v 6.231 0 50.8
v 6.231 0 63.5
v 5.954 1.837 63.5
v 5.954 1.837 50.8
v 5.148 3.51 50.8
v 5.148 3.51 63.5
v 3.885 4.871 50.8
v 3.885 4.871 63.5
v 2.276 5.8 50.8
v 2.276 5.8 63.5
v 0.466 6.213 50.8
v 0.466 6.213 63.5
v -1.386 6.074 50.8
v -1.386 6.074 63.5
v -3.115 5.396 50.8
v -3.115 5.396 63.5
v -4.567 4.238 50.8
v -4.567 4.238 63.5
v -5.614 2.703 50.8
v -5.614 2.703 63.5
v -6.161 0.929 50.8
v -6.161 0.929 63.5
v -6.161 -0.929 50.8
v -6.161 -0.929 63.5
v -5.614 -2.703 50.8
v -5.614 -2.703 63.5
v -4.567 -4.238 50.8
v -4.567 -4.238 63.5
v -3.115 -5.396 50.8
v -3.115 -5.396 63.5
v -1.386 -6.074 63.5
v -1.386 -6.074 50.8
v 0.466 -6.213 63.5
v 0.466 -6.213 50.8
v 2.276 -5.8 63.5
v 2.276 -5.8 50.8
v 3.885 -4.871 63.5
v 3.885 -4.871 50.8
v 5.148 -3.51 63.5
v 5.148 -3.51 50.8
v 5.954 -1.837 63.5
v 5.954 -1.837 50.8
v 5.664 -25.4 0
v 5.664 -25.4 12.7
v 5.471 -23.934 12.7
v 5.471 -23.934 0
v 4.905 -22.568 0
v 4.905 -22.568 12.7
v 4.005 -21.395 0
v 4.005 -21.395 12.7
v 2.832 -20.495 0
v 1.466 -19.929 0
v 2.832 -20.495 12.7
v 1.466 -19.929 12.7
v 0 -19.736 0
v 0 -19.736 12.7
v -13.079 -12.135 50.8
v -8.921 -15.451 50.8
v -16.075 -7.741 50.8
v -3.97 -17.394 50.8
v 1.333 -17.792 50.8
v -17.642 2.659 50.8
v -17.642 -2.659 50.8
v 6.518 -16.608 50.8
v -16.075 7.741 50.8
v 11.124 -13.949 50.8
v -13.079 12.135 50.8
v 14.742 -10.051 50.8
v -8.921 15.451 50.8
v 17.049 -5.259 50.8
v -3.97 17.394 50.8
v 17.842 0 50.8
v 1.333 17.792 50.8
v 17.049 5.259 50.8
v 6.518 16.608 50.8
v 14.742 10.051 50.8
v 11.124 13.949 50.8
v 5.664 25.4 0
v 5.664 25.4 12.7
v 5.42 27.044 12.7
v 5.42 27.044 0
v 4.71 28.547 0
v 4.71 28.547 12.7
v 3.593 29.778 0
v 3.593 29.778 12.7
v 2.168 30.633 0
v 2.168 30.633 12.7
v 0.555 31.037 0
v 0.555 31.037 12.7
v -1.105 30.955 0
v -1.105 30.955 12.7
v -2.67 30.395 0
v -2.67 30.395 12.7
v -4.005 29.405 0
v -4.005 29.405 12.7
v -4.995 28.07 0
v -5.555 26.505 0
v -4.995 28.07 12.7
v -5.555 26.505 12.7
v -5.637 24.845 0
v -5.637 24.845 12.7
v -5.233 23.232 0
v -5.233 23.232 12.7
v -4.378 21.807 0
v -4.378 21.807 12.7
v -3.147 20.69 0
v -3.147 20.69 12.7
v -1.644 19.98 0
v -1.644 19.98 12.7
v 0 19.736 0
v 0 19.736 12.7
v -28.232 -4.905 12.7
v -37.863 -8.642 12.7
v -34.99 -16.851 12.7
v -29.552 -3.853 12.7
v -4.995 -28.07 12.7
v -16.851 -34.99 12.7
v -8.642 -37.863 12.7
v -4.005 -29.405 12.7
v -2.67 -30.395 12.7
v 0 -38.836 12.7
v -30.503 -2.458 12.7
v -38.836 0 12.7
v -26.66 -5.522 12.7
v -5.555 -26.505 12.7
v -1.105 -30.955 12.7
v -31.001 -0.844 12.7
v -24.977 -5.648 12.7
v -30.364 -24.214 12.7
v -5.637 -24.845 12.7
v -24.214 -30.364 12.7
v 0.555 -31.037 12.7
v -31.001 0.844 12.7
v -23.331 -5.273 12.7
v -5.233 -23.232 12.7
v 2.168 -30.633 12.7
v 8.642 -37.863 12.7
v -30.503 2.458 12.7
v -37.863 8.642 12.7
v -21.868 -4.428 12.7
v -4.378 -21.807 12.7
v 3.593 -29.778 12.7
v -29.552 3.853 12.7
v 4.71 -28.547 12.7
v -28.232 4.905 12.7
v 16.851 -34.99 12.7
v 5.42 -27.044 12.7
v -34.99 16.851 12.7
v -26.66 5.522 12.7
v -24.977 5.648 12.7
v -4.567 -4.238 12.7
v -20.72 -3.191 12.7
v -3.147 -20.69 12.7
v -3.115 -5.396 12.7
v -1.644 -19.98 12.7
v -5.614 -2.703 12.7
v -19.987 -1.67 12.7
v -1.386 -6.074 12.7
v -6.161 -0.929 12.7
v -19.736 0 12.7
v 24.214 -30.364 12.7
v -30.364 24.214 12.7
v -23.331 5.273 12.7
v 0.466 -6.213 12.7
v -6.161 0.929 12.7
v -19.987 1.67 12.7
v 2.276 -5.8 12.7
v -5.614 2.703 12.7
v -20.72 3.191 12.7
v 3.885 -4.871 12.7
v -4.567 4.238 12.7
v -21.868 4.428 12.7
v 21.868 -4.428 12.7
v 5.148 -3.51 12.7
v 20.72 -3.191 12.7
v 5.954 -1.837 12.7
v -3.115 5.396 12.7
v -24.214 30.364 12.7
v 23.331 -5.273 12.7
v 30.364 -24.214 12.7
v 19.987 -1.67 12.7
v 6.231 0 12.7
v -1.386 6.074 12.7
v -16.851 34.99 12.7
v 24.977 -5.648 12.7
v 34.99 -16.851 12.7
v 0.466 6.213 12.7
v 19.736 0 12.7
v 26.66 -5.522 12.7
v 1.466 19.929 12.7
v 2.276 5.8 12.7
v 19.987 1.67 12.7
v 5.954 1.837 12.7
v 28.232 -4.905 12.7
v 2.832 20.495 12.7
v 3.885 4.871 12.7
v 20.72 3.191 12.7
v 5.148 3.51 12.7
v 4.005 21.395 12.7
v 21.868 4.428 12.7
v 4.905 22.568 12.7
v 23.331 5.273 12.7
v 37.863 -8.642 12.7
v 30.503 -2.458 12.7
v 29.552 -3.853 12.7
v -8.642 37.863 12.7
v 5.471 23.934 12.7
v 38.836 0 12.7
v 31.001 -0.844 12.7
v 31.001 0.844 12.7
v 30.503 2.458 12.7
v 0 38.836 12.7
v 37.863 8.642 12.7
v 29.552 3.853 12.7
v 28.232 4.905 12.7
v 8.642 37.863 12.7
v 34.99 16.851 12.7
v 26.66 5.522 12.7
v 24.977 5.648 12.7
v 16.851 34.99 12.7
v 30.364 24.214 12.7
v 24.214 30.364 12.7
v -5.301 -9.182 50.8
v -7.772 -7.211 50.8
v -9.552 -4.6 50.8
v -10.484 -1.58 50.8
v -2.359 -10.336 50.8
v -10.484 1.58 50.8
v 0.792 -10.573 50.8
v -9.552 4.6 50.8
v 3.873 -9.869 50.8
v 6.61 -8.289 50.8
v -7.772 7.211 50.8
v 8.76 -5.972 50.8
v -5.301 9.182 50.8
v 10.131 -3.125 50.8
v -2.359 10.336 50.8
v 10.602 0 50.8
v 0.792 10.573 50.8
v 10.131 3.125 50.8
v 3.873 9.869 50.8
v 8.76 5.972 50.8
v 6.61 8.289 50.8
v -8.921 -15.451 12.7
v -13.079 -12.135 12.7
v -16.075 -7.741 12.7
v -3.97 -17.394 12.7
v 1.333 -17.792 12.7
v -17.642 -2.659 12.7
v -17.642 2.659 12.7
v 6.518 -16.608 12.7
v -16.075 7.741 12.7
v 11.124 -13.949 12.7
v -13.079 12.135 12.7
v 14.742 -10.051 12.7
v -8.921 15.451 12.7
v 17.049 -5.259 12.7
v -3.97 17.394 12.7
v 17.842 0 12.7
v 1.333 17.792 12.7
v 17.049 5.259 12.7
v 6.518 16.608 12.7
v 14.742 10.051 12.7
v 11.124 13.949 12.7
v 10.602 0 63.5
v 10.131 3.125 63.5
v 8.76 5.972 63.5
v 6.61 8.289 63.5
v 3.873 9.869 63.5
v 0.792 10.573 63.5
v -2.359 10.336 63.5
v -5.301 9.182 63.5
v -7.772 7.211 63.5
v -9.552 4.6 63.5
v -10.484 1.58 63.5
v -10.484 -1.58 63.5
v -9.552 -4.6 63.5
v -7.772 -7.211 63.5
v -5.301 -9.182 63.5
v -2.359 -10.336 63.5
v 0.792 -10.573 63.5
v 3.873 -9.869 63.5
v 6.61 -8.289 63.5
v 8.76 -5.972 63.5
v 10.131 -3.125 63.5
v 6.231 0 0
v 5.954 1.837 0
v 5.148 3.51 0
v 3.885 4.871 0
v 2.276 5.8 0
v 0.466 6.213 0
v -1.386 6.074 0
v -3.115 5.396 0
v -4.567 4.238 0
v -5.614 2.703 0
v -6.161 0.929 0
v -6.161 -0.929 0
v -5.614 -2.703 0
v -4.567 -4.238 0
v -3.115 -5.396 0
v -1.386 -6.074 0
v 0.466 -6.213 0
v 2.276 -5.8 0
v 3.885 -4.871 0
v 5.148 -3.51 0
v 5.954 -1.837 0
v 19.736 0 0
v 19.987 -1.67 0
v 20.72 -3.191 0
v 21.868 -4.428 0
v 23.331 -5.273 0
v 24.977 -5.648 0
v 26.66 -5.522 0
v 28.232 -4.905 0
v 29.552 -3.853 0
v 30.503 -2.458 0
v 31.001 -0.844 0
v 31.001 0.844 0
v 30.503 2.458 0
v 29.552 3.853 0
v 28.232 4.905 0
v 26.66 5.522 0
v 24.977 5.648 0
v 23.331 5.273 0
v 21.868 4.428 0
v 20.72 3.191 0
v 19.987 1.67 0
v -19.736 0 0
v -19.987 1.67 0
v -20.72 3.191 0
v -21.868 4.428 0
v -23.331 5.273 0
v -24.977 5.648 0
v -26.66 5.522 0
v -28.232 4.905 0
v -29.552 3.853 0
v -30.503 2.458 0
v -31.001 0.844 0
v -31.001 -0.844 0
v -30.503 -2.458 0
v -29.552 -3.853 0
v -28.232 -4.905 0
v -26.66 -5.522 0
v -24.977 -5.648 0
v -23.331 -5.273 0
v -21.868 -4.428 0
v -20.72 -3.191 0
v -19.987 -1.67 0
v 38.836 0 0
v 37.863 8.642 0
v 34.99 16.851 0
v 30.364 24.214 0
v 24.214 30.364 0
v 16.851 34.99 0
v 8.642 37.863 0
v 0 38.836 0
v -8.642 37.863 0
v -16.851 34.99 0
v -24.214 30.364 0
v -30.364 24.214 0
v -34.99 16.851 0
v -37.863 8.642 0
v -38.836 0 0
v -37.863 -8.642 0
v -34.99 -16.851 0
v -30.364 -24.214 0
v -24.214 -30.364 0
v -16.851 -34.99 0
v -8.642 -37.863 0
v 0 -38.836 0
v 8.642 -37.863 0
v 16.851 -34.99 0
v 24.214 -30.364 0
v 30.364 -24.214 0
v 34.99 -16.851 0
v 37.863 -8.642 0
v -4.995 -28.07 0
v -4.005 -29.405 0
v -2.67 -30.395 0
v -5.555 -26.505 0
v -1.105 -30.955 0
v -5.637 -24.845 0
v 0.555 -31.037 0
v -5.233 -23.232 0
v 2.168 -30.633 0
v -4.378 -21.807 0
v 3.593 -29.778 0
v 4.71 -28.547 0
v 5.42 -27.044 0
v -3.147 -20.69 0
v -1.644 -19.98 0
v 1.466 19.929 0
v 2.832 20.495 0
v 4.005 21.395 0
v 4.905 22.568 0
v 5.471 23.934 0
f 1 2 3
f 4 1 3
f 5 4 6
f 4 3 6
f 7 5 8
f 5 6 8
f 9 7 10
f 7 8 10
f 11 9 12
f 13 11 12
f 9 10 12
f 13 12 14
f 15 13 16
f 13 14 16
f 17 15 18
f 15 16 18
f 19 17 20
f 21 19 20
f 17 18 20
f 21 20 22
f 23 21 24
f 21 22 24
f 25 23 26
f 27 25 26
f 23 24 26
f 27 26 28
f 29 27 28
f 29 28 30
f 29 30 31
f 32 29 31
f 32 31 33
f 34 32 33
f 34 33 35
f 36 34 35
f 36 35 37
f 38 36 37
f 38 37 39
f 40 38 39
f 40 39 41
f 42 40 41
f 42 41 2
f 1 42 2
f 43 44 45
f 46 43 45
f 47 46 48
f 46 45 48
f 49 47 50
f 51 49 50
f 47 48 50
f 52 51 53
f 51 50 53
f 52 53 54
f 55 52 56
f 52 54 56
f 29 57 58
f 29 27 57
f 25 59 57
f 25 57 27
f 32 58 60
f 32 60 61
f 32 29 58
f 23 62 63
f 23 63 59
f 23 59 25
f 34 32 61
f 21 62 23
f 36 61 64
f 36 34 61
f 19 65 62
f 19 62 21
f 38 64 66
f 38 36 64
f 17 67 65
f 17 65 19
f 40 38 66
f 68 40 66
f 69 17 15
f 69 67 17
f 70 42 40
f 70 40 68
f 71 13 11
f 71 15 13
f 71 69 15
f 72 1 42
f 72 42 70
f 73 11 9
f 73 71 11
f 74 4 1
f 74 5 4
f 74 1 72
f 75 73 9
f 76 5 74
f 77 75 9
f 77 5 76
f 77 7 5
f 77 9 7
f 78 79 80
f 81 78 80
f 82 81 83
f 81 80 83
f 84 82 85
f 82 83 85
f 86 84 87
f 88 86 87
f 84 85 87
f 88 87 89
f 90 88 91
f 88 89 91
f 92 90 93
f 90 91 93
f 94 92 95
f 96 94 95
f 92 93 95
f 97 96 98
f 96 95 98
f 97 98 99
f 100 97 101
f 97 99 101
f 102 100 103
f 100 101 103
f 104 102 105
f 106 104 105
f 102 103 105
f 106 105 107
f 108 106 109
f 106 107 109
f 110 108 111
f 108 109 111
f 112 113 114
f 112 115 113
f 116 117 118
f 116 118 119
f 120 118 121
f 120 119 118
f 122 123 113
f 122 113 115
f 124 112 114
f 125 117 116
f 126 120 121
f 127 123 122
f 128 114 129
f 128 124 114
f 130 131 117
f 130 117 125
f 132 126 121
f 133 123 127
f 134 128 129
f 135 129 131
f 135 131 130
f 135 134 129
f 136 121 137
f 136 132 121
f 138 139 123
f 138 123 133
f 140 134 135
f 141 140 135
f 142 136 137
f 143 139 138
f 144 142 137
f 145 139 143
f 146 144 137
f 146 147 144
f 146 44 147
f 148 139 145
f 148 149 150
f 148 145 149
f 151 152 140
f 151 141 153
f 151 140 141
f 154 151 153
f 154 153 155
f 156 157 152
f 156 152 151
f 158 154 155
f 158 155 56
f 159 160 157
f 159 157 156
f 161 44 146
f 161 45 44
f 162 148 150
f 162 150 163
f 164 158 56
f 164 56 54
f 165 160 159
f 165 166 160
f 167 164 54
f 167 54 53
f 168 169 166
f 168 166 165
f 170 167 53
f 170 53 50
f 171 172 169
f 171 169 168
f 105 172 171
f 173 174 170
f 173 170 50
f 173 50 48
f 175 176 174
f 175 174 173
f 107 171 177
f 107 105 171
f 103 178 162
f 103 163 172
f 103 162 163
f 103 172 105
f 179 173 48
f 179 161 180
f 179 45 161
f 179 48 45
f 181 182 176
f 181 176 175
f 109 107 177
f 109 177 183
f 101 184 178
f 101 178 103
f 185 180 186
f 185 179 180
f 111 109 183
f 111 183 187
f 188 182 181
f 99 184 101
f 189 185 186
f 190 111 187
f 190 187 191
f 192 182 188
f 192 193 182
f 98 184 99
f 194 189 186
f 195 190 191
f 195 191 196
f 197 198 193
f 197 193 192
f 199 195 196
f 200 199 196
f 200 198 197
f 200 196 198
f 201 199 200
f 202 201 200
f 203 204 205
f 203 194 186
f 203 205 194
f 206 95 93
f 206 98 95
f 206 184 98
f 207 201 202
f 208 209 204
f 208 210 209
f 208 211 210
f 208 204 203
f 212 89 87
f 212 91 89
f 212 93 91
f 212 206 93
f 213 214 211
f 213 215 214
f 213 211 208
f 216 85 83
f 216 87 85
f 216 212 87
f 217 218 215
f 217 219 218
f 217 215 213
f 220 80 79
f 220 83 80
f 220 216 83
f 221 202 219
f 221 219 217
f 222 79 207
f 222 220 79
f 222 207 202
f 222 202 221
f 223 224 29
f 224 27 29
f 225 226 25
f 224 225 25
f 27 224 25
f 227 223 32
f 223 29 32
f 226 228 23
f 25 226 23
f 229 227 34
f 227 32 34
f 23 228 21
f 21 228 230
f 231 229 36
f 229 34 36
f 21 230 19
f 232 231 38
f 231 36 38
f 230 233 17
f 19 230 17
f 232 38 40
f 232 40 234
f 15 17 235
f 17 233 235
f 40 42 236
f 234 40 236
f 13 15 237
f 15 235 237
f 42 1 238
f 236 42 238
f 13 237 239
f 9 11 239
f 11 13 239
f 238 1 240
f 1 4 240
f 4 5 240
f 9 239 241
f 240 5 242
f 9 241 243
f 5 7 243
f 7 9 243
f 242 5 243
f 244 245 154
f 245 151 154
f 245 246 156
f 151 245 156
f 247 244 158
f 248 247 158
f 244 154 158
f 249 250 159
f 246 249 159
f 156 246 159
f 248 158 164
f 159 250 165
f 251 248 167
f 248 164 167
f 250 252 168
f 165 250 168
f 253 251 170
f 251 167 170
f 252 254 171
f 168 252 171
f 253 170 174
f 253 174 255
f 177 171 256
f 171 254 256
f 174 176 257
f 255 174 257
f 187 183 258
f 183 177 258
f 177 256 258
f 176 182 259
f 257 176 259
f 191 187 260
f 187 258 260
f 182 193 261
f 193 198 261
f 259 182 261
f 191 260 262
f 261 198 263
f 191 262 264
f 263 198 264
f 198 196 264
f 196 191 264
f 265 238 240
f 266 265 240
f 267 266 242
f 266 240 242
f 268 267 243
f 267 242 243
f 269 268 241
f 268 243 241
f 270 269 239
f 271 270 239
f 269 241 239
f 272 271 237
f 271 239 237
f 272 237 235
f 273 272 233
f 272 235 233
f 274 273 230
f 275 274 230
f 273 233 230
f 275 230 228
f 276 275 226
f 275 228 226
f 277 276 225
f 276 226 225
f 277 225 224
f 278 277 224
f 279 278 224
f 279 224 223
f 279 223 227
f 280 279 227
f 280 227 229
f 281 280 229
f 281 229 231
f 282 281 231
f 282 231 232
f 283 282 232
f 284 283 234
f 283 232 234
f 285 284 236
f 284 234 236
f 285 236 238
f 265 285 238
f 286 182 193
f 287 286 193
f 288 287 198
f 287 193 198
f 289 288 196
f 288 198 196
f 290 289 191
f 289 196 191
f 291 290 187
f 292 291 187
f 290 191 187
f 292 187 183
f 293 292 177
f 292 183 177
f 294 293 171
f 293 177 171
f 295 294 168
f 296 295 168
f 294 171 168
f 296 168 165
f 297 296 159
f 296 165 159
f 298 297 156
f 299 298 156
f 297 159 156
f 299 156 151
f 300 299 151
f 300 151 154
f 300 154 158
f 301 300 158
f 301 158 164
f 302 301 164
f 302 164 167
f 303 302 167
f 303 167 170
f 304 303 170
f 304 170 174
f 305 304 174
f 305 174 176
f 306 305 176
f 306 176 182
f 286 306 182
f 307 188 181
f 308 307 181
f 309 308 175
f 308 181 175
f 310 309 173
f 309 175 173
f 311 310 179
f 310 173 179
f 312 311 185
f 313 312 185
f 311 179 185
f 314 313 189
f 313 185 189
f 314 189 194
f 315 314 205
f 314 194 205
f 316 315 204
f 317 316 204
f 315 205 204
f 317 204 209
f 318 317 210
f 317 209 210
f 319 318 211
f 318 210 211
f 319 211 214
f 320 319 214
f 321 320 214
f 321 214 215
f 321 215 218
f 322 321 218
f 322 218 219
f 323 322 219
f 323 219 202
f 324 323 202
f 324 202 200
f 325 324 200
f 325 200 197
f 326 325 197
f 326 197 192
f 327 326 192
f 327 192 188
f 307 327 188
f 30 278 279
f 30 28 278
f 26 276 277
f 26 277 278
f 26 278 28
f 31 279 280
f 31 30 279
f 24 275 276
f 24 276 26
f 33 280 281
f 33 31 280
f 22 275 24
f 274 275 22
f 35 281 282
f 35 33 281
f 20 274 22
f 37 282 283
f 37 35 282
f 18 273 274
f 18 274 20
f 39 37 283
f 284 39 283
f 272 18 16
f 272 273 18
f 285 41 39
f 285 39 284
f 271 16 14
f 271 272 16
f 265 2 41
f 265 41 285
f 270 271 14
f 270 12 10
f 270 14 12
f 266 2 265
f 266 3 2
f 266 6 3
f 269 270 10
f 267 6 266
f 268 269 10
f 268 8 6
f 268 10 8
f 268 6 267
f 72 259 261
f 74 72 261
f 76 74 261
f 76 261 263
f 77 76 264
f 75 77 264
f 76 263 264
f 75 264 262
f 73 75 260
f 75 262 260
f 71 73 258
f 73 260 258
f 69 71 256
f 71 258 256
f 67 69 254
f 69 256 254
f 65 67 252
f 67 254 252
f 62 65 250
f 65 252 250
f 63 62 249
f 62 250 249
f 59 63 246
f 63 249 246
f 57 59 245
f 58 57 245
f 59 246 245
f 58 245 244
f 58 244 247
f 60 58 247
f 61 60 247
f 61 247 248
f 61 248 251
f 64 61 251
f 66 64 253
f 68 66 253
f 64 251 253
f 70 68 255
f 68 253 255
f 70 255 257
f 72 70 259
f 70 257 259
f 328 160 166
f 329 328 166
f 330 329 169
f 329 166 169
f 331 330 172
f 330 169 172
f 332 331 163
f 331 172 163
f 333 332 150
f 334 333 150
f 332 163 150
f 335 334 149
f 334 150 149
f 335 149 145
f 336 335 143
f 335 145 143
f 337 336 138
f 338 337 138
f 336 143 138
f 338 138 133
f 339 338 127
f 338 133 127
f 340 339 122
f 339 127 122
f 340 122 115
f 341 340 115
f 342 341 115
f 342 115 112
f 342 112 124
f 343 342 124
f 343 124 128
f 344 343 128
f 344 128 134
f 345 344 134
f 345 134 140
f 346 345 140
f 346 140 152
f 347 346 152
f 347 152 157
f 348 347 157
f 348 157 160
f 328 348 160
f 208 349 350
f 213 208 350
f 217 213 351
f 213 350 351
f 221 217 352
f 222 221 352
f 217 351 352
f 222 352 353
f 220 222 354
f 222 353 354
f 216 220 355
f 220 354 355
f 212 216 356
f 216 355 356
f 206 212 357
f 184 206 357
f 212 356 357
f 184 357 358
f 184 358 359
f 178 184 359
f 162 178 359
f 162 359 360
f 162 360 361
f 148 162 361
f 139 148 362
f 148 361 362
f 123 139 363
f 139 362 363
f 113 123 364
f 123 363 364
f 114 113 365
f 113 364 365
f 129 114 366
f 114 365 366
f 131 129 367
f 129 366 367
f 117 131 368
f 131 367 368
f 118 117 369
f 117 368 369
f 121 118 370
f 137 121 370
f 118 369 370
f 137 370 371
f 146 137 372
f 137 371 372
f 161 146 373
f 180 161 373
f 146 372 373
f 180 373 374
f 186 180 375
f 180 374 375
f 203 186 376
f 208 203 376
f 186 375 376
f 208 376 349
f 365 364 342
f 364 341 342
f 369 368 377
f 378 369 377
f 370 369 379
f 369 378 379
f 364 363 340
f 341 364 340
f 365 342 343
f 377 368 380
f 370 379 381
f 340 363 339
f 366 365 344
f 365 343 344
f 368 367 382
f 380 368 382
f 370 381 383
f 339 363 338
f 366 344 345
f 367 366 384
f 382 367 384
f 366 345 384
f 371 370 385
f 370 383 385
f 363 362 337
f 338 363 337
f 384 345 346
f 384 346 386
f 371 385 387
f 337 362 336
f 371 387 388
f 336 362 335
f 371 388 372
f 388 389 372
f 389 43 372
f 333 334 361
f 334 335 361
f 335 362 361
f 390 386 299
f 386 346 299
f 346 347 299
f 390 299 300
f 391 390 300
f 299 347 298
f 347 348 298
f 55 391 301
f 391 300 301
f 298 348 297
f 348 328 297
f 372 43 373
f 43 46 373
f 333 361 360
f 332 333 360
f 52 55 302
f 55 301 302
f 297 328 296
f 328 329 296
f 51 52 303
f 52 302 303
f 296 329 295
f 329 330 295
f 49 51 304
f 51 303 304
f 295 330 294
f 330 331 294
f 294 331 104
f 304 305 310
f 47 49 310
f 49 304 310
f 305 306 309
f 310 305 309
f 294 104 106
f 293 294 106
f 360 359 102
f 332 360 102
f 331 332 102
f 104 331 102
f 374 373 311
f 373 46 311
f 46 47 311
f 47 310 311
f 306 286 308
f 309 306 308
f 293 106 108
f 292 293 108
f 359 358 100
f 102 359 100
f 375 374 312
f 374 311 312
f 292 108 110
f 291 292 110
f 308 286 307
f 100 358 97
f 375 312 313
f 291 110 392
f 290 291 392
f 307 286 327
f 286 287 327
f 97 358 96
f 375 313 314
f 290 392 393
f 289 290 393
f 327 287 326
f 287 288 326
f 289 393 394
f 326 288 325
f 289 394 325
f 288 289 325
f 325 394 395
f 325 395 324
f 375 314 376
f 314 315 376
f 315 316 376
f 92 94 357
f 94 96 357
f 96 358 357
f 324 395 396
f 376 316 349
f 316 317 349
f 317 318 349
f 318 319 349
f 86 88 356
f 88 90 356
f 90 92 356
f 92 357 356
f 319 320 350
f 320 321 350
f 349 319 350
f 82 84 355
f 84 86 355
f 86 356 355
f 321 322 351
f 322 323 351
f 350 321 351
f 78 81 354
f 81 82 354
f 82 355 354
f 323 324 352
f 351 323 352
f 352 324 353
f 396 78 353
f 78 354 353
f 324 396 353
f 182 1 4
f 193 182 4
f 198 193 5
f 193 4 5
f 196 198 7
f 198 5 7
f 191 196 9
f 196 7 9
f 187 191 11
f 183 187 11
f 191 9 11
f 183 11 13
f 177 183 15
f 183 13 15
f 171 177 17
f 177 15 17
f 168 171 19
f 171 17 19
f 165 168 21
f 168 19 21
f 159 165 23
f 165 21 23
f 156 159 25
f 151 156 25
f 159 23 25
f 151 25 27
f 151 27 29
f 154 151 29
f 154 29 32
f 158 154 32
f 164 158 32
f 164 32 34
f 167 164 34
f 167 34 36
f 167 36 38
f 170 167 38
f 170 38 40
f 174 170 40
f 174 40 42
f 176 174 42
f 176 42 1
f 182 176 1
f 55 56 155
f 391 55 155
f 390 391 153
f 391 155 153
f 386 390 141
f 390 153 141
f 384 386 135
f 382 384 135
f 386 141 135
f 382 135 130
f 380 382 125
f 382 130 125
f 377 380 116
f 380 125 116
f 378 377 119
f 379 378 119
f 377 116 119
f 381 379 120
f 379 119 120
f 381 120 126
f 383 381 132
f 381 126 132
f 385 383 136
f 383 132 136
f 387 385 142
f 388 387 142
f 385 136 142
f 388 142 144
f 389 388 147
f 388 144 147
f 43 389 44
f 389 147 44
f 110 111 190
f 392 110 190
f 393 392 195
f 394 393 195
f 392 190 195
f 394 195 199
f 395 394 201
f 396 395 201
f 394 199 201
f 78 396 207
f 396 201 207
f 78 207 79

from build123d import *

# Parameters (mm, degrees)
F0_R     = 38.836494
F1_DEPTH = 12.7
F2_R     = 17.841747
F3_DEPTH = 38.1
F4_R     = 10.602316
F5_DEPTH = 12.7
F6_R     = 6.230647
F7_DEPTH = 63.5
F8_R     = 5.6642
F9_DEPTH = 25.4


with BuildPart() as f1:
    # F0 (on Top) → F1 (new body)
    with BuildSketch(Plane.XY):
        Circle(F0_R)
    extrude(amount=F1_DEPTH)


with BuildPart() as f3:
    # F2 (on face) → F3 (new body)
    with BuildSketch(Plane.XY.offset(12.7)):
        Circle(F2_R)
    extrude(amount=F3_DEPTH)


with BuildPart() as f5:
    # F4 (on face) → F5 (new body)
    with BuildSketch(Plane.XY.offset(50.8)):
        Circle(F4_R)
    extrude(amount=F5_DEPTH)


with BuildPart() as f7_tool:
    # F6 (on face) → F7 (new body)
    with BuildSketch(Plane.XY.offset(63.5)):
        Circle(F6_R)
    extrude(amount=-F7_DEPTH)


with BuildPart() as f1_1:
    add(f1.part)

    # F7: cut by f7_tool
    add(f7_tool.part, mode=Mode.SUBTRACT)

    # F8 (on face) → F9 (cut)
    with BuildSketch(Plane.XY.offset(12.7)):
        with BuildLine():
            ThreePointArc((5.6642, 25.4), (-4.005194, 29.405194), (0, 19.7358))
            ThreePointArc((0, 19.7358), (4.005194, 21.394806), (5.6642, 25.4))
        make_face()
        with BuildLine():
            ThreePointArc((5.6642, -25.4), (4.005194, -21.394806), (0, -19.7358))
            ThreePointArc((0, -19.7358), (-4.005194, -29.405194), (5.6642, -25.4))
        make_face()
        with BuildLine():
            ThreePointArc((31.0642, 0), (25.4, 5.6642), (19.7358, 0))
            ThreePointArc((19.7358, 0), (25.4, -5.6642), (31.0642, 0))
        make_face()
        with Locations((-25.4, 0)):
            Circle(F8_R)
    extrude(amount=-F9_DEPTH, mode=Mode.SUBTRACT)


with BuildPart() as f3_1:
    add(f3.part)

    # F7: cut by f7_tool
    add(f7_tool.part, mode=Mode.SUBTRACT)


with BuildPart() as f5_1:
    add(f5.part)

    # F7: cut by f7_tool
    add(f7_tool.part, mode=Mode.SUBTRACT)


solid = Compound([f1_1.part, f3_1.part, f5_1.part])
